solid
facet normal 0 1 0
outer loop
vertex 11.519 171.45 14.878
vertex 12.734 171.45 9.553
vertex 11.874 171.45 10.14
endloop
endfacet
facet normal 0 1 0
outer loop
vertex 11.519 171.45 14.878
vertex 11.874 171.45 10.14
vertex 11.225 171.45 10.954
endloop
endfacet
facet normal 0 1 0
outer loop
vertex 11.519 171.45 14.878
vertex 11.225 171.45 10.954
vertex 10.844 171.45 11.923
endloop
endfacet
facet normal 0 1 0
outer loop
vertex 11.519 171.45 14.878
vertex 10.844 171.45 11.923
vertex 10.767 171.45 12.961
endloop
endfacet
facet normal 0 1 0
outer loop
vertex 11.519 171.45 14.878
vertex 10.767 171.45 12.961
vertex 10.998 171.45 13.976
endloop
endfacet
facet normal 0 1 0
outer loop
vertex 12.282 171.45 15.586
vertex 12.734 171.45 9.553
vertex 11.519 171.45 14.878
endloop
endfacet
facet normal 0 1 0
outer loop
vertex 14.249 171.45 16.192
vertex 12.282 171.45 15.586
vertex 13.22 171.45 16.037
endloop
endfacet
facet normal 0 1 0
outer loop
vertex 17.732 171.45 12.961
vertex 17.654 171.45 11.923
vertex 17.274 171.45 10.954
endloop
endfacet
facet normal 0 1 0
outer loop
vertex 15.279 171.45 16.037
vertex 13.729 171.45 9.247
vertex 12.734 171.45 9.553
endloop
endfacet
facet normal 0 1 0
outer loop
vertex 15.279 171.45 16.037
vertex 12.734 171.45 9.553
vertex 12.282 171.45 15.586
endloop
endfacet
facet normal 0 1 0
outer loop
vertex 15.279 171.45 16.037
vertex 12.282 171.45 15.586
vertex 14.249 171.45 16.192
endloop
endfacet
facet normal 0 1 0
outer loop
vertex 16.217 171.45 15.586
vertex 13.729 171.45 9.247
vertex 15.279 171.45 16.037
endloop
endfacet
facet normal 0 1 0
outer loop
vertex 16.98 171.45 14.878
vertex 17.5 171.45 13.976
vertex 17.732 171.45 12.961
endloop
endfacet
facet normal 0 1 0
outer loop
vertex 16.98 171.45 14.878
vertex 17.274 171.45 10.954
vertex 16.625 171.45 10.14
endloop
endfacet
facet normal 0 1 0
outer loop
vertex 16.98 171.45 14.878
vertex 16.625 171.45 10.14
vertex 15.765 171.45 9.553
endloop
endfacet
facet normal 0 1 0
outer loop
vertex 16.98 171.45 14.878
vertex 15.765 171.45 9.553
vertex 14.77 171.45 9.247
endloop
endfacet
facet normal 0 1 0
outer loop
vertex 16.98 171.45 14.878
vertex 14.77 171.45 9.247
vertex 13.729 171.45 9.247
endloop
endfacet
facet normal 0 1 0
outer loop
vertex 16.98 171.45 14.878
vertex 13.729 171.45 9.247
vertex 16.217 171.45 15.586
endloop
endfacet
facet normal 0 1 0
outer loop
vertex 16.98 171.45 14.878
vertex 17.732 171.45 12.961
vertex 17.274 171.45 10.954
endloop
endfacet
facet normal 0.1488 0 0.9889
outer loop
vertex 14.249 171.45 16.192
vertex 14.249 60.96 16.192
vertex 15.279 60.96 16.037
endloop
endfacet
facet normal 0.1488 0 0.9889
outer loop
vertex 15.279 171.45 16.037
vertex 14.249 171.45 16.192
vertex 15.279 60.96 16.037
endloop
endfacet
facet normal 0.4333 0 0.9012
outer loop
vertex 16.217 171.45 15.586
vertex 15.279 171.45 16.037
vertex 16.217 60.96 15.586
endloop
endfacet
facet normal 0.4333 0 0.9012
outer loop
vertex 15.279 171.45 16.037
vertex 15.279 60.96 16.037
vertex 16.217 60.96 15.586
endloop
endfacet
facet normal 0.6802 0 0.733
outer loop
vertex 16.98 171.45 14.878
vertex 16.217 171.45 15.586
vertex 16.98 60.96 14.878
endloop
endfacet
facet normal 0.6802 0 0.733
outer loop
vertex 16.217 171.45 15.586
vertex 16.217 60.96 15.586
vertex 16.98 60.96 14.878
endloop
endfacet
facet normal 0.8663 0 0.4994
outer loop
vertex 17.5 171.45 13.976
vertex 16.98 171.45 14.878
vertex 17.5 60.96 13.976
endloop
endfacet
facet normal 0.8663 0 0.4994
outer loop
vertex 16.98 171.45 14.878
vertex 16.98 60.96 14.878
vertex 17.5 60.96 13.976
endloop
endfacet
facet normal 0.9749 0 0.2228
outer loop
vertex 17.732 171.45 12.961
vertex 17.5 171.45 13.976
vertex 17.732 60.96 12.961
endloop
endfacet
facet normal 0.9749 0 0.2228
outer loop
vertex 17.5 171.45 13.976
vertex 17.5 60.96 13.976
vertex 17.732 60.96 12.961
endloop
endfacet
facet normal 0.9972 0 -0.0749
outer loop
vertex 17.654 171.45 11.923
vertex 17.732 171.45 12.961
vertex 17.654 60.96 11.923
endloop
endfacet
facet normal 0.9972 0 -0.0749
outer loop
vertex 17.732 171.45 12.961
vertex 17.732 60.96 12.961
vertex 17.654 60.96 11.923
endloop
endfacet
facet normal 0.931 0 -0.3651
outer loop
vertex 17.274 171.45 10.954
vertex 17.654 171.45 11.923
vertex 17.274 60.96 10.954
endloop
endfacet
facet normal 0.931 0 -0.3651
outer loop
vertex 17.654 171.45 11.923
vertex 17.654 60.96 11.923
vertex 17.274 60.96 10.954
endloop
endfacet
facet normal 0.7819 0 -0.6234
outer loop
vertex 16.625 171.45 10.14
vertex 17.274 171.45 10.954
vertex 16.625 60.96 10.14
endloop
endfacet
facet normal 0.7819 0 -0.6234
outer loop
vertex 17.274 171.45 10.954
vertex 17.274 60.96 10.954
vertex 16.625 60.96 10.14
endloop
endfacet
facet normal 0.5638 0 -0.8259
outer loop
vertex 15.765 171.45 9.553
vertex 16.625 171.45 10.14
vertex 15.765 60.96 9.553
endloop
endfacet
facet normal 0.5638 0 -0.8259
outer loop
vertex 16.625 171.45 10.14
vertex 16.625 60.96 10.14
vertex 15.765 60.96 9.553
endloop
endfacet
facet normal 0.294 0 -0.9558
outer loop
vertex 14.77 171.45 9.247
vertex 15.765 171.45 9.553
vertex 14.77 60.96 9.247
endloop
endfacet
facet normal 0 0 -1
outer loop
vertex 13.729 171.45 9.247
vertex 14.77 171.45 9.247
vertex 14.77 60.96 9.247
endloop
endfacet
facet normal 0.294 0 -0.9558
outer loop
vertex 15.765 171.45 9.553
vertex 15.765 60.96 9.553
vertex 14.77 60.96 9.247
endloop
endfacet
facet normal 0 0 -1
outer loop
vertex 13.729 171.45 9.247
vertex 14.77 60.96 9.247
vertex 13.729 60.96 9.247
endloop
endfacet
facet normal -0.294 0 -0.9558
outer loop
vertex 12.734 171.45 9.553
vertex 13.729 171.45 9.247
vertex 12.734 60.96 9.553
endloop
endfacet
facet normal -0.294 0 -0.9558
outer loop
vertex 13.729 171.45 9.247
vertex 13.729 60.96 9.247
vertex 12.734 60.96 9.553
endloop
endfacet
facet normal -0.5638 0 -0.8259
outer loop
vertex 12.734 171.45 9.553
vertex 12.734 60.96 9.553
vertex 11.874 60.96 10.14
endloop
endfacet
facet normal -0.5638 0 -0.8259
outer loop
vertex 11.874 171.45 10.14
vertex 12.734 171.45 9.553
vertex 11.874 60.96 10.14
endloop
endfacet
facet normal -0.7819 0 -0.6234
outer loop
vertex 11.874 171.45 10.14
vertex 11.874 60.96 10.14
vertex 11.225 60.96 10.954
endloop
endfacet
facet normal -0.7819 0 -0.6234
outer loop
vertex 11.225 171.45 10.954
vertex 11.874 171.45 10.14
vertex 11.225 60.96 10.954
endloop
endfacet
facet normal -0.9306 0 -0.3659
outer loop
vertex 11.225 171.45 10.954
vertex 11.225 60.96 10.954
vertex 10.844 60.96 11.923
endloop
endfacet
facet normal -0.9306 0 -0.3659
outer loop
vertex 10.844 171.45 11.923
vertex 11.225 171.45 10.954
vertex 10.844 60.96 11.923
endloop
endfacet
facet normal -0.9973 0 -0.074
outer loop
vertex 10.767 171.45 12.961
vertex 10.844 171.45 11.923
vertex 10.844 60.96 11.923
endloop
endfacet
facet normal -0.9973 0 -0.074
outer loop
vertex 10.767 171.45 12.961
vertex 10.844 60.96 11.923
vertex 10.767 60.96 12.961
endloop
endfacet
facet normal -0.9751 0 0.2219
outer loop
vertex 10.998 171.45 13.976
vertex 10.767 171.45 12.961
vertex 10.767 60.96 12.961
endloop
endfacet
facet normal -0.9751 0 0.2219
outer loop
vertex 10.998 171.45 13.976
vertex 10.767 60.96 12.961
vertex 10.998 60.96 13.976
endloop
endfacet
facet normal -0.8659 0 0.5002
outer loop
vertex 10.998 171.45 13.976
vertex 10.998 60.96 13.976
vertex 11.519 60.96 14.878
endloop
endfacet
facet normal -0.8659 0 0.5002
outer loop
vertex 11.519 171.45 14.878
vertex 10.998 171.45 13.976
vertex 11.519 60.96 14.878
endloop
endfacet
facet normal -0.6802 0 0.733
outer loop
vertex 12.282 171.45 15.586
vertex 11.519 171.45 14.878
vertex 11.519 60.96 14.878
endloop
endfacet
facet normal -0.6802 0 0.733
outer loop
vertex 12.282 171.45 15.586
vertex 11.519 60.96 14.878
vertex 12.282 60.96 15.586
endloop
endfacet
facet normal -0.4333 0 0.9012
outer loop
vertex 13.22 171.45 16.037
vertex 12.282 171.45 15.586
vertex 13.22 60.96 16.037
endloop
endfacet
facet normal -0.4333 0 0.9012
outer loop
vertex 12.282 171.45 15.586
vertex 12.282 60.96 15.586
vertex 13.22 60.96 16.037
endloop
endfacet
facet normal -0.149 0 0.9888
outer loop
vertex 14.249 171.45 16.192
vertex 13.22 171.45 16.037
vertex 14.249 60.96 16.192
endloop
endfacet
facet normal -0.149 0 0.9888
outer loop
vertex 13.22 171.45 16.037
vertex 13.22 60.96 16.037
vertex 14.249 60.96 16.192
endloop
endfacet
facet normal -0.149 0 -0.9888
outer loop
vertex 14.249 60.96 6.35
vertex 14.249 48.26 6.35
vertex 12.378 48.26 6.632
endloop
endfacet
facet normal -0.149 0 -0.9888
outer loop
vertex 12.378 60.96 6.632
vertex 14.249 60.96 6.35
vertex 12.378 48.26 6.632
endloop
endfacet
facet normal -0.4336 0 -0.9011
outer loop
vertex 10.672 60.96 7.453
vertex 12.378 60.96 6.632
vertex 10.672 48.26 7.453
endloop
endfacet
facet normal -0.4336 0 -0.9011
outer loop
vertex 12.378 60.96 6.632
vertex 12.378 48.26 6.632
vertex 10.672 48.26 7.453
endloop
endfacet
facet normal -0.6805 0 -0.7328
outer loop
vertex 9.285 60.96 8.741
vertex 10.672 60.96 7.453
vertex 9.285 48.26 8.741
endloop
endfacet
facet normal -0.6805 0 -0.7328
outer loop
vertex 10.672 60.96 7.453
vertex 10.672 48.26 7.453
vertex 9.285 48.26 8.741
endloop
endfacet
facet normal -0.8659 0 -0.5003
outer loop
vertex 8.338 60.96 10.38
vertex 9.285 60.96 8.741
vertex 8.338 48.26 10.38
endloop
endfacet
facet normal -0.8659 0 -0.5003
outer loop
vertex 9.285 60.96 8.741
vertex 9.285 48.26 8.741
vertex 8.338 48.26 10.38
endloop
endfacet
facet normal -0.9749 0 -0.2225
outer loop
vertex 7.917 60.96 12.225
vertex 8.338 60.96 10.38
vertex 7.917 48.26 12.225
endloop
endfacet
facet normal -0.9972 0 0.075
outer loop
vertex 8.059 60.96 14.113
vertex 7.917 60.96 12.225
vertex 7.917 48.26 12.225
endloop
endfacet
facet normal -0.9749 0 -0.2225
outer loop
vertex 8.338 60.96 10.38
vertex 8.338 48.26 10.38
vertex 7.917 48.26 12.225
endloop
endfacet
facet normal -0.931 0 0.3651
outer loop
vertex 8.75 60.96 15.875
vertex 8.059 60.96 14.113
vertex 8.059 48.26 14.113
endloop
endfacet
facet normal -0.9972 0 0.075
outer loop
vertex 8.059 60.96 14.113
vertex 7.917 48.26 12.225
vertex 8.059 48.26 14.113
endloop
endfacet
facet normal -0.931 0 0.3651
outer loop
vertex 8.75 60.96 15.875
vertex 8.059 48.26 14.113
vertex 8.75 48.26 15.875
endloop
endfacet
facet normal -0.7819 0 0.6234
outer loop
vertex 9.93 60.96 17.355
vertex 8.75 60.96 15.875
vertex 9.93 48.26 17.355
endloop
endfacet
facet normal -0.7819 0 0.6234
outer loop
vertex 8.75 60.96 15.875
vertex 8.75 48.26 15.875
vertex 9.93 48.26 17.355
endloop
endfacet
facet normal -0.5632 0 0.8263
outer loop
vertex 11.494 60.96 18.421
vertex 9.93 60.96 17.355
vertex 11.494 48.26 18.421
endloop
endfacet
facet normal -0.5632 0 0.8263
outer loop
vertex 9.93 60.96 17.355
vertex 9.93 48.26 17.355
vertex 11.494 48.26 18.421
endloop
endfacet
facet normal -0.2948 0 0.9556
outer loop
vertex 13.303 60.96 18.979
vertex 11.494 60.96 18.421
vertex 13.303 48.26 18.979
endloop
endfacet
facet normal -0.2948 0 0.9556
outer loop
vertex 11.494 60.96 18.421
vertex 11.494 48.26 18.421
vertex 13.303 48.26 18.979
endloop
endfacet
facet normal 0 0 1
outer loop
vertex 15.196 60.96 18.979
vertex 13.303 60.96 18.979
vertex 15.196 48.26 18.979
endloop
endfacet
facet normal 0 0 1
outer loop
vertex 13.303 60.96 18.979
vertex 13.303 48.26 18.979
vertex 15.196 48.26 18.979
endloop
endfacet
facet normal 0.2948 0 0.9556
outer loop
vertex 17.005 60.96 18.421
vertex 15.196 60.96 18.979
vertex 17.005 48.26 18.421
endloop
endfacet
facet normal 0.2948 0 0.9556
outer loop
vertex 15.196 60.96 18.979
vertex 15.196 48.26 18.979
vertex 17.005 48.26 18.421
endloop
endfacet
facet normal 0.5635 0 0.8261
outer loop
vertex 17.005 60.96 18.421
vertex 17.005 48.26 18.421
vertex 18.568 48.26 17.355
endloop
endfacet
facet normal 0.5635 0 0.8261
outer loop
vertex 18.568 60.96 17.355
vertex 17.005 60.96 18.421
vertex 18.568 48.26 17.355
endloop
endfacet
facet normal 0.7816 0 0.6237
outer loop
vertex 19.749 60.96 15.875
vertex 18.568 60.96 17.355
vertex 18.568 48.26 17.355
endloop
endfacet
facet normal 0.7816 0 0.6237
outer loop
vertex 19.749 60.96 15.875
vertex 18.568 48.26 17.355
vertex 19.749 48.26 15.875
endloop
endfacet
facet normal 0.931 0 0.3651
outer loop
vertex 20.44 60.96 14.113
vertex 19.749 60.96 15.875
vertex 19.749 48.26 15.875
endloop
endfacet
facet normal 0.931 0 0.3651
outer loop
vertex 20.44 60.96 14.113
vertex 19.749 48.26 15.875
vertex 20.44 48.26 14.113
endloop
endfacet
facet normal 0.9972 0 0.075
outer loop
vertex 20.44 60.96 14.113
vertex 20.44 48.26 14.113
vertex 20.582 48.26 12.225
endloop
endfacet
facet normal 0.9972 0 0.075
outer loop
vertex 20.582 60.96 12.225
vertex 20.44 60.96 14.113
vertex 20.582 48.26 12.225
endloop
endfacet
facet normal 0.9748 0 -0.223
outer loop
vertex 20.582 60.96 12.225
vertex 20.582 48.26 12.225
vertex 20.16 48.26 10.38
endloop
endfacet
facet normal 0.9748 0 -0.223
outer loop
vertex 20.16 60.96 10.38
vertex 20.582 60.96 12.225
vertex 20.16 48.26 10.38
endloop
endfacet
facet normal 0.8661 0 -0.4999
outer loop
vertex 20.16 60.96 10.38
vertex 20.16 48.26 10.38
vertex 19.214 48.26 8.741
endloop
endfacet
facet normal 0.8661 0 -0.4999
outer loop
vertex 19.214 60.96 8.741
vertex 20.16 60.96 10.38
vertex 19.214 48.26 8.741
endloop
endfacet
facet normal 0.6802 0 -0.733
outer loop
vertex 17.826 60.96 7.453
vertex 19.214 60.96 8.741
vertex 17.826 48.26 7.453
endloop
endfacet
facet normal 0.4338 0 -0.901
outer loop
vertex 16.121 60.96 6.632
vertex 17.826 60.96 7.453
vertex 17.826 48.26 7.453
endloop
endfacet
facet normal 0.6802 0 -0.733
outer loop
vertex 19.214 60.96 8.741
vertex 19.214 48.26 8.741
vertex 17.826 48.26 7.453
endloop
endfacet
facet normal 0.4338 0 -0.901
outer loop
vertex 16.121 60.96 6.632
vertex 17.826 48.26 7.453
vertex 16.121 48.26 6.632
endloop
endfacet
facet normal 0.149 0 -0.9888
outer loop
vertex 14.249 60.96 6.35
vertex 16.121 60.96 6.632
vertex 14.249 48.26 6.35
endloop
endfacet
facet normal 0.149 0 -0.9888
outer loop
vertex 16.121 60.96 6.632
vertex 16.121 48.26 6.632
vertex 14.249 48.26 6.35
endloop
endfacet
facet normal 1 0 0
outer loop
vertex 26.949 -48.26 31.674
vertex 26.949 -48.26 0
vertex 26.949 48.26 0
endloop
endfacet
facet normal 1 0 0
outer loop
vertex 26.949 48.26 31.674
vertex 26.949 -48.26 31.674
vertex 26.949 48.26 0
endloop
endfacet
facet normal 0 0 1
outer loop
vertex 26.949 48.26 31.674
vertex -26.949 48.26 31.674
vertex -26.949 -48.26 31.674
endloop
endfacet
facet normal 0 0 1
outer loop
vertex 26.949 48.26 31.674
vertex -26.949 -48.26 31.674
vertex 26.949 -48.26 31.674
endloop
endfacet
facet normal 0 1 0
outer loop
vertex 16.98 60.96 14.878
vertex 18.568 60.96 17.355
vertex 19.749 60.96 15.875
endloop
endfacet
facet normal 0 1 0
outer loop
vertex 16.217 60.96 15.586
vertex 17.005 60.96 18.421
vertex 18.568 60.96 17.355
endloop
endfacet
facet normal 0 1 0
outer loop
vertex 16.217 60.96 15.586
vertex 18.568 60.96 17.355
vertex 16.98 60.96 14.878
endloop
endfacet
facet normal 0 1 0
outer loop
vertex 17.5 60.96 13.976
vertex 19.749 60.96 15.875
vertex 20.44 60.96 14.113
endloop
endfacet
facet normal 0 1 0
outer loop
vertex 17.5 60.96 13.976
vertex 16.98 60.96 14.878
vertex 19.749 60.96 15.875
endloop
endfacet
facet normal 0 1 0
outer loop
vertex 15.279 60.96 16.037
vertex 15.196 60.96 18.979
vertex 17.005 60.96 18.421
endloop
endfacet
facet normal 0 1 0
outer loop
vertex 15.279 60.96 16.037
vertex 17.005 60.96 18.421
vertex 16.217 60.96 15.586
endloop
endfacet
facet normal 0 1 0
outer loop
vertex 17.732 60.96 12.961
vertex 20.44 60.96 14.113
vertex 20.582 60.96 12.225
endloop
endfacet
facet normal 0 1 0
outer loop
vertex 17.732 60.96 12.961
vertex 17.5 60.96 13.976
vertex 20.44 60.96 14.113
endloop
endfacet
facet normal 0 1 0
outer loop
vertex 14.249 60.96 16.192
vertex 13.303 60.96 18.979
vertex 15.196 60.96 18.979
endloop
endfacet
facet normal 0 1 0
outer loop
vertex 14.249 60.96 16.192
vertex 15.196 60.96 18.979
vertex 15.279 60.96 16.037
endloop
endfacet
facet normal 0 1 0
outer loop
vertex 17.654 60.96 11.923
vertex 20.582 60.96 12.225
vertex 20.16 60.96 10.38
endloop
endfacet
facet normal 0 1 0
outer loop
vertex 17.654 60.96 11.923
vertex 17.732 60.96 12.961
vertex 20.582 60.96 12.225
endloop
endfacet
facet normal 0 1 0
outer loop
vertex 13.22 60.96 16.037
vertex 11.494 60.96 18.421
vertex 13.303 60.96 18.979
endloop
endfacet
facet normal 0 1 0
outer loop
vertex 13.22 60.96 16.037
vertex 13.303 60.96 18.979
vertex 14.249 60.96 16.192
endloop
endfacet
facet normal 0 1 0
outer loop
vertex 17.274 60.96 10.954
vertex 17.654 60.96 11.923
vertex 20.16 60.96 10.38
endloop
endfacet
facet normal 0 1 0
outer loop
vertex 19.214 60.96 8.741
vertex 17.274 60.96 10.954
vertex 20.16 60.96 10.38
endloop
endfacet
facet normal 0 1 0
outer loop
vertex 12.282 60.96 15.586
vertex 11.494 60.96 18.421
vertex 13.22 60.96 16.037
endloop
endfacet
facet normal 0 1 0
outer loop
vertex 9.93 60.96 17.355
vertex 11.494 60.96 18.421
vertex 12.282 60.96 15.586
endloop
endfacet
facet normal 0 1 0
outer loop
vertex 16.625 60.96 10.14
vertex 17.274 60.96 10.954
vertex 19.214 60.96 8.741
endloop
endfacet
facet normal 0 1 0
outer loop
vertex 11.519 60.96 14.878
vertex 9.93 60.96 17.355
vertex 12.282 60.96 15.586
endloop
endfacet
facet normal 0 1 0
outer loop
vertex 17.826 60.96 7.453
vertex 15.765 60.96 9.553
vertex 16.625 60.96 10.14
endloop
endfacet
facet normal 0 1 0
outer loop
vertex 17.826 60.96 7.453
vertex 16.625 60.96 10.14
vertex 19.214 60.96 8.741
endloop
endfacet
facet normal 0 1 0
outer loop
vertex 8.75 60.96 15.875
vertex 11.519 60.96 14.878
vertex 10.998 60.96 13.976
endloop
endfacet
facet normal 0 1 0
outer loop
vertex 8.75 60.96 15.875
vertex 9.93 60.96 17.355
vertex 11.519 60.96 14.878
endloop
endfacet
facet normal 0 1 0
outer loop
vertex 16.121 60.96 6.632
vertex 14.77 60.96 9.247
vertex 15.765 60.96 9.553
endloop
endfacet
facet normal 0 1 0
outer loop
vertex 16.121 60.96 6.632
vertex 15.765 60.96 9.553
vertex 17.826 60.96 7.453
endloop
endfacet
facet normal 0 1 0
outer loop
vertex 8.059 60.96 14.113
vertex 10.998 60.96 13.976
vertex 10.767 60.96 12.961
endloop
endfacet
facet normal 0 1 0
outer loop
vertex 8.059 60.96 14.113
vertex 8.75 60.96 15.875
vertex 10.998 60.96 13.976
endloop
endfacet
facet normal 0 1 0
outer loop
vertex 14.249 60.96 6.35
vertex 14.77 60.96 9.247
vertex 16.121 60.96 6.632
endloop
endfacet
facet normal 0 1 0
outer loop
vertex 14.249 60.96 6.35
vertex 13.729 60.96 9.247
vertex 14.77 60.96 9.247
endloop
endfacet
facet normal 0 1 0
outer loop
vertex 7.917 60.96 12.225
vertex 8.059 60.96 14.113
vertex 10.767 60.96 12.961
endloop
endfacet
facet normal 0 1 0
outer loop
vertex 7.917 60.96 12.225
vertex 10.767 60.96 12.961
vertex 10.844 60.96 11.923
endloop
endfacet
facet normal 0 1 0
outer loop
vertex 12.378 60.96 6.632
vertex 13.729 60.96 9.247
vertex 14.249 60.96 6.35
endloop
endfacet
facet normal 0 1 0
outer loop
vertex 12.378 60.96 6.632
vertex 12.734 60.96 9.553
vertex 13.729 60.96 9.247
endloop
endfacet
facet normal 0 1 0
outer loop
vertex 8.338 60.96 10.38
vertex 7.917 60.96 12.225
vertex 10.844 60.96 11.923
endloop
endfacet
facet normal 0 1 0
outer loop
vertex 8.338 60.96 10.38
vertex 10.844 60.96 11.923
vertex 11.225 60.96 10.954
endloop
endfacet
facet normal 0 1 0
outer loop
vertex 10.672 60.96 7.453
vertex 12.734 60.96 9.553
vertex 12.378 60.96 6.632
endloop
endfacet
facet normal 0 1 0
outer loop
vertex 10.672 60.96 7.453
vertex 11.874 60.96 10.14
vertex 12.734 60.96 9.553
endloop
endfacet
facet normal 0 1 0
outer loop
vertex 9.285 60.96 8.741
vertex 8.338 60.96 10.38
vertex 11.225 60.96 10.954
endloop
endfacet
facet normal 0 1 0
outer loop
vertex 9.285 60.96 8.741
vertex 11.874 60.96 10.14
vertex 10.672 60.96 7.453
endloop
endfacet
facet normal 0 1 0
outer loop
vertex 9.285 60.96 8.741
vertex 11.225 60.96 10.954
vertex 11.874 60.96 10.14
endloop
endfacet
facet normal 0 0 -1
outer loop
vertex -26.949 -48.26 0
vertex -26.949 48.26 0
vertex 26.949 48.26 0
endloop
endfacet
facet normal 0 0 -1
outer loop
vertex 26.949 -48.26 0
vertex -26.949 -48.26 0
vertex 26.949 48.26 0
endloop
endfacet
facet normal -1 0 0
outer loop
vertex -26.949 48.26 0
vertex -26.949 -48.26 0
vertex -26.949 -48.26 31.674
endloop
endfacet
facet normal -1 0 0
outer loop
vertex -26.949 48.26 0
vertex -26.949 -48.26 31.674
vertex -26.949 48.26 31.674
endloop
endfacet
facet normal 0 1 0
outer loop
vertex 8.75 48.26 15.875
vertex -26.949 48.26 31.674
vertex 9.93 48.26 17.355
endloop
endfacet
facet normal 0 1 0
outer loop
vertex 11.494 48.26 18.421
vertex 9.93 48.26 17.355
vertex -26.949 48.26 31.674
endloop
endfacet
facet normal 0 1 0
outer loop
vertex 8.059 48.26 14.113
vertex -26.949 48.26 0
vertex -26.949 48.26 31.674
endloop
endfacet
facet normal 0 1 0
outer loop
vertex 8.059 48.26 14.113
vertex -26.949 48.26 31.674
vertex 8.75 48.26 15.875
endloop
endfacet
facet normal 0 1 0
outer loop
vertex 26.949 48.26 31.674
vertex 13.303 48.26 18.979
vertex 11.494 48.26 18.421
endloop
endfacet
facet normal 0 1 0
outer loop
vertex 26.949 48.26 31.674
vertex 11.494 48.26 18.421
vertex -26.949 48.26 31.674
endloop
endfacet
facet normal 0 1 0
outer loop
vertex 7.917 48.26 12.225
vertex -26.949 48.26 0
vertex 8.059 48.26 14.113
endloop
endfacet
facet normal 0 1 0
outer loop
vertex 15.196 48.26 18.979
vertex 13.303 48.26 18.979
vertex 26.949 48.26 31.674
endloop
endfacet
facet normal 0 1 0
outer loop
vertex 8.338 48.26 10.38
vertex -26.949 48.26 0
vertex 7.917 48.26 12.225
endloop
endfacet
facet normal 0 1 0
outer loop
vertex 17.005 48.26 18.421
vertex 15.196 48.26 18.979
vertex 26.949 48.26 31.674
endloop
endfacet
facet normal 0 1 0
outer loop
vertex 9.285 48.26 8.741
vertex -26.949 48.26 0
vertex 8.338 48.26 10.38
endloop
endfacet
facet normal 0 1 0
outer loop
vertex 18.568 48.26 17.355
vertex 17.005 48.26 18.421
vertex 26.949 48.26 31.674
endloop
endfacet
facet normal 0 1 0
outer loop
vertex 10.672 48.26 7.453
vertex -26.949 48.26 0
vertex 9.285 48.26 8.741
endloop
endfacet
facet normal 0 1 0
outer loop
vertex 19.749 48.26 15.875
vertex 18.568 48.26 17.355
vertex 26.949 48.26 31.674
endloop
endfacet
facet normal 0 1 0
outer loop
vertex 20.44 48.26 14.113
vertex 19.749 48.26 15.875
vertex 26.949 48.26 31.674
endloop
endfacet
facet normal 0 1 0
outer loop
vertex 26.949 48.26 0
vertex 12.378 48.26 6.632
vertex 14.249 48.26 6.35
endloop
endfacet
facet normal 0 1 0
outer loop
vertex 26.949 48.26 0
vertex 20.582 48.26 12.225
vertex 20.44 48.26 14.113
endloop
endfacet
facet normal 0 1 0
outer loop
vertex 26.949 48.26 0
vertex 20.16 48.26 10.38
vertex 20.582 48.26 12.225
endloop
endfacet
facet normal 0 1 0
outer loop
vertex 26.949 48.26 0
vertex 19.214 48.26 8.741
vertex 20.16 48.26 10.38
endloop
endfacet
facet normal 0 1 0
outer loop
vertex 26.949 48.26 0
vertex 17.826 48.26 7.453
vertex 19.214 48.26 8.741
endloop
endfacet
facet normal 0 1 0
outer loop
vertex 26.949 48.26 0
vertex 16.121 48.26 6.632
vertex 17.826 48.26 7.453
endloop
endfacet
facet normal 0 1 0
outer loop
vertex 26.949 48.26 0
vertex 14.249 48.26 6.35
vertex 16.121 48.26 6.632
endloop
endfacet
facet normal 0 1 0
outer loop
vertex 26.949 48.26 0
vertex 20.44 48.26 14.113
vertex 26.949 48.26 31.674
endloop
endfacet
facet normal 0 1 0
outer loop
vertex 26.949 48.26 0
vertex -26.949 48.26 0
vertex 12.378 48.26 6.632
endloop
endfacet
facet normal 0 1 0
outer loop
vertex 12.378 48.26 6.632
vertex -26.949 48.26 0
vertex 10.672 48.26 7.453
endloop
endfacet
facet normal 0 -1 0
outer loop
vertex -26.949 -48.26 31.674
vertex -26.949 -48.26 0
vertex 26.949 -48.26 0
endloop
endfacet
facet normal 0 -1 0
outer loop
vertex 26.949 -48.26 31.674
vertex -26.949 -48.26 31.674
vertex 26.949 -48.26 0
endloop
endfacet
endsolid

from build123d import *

# Parameters (mm, degrees)
SKETCH1_W           = 53.8988
SKETCH1_H           = 96.52
BOSS_EXTRUDE1_DEPTH = 31.6738
SKETCH2_R           = 6.35
BOSS_EXTRUDE2_DEPTH = 12.7
SKETCH3_R           = 3.4925
BOSS_EXTRUDE3_DEPTH = 110.49


with BuildPart() as part:
    # Sketch1 → Boss-Extrude1 (new body)
    with BuildSketch(Plane.XY):
        Rectangle(SKETCH1_W, SKETCH1_H)
    extrude(amount=BOSS_EXTRUDE1_DEPTH)

    # Sketch2 → Boss-Extrude2 (add)
    with BuildSketch(Plane(origin=(0, 48.26, 0), x_dir=(1, 0, 0), z_dir=(0, 1, 0))):
        with Locations(Location((14.2494, -12.7, 0), (0, 0, 90))):
            Circle(SKETCH2_R)
    extrude(amount=BOSS_EXTRUDE2_DEPTH)

    # Sketch3 → Boss-Extrude3 (add)
    with BuildSketch(Plane(origin=(0, 60.96, 0), x_dir=(1, 0, 0), z_dir=(0, 1, 0))):
        with Locations(Location((14.2494, -12.7, 0), (0, 0, 270))):
            Circle(SKETCH3_R)
    extrude(amount=BOSS_EXTRUDE3_DEPTH)


solid = part.part
